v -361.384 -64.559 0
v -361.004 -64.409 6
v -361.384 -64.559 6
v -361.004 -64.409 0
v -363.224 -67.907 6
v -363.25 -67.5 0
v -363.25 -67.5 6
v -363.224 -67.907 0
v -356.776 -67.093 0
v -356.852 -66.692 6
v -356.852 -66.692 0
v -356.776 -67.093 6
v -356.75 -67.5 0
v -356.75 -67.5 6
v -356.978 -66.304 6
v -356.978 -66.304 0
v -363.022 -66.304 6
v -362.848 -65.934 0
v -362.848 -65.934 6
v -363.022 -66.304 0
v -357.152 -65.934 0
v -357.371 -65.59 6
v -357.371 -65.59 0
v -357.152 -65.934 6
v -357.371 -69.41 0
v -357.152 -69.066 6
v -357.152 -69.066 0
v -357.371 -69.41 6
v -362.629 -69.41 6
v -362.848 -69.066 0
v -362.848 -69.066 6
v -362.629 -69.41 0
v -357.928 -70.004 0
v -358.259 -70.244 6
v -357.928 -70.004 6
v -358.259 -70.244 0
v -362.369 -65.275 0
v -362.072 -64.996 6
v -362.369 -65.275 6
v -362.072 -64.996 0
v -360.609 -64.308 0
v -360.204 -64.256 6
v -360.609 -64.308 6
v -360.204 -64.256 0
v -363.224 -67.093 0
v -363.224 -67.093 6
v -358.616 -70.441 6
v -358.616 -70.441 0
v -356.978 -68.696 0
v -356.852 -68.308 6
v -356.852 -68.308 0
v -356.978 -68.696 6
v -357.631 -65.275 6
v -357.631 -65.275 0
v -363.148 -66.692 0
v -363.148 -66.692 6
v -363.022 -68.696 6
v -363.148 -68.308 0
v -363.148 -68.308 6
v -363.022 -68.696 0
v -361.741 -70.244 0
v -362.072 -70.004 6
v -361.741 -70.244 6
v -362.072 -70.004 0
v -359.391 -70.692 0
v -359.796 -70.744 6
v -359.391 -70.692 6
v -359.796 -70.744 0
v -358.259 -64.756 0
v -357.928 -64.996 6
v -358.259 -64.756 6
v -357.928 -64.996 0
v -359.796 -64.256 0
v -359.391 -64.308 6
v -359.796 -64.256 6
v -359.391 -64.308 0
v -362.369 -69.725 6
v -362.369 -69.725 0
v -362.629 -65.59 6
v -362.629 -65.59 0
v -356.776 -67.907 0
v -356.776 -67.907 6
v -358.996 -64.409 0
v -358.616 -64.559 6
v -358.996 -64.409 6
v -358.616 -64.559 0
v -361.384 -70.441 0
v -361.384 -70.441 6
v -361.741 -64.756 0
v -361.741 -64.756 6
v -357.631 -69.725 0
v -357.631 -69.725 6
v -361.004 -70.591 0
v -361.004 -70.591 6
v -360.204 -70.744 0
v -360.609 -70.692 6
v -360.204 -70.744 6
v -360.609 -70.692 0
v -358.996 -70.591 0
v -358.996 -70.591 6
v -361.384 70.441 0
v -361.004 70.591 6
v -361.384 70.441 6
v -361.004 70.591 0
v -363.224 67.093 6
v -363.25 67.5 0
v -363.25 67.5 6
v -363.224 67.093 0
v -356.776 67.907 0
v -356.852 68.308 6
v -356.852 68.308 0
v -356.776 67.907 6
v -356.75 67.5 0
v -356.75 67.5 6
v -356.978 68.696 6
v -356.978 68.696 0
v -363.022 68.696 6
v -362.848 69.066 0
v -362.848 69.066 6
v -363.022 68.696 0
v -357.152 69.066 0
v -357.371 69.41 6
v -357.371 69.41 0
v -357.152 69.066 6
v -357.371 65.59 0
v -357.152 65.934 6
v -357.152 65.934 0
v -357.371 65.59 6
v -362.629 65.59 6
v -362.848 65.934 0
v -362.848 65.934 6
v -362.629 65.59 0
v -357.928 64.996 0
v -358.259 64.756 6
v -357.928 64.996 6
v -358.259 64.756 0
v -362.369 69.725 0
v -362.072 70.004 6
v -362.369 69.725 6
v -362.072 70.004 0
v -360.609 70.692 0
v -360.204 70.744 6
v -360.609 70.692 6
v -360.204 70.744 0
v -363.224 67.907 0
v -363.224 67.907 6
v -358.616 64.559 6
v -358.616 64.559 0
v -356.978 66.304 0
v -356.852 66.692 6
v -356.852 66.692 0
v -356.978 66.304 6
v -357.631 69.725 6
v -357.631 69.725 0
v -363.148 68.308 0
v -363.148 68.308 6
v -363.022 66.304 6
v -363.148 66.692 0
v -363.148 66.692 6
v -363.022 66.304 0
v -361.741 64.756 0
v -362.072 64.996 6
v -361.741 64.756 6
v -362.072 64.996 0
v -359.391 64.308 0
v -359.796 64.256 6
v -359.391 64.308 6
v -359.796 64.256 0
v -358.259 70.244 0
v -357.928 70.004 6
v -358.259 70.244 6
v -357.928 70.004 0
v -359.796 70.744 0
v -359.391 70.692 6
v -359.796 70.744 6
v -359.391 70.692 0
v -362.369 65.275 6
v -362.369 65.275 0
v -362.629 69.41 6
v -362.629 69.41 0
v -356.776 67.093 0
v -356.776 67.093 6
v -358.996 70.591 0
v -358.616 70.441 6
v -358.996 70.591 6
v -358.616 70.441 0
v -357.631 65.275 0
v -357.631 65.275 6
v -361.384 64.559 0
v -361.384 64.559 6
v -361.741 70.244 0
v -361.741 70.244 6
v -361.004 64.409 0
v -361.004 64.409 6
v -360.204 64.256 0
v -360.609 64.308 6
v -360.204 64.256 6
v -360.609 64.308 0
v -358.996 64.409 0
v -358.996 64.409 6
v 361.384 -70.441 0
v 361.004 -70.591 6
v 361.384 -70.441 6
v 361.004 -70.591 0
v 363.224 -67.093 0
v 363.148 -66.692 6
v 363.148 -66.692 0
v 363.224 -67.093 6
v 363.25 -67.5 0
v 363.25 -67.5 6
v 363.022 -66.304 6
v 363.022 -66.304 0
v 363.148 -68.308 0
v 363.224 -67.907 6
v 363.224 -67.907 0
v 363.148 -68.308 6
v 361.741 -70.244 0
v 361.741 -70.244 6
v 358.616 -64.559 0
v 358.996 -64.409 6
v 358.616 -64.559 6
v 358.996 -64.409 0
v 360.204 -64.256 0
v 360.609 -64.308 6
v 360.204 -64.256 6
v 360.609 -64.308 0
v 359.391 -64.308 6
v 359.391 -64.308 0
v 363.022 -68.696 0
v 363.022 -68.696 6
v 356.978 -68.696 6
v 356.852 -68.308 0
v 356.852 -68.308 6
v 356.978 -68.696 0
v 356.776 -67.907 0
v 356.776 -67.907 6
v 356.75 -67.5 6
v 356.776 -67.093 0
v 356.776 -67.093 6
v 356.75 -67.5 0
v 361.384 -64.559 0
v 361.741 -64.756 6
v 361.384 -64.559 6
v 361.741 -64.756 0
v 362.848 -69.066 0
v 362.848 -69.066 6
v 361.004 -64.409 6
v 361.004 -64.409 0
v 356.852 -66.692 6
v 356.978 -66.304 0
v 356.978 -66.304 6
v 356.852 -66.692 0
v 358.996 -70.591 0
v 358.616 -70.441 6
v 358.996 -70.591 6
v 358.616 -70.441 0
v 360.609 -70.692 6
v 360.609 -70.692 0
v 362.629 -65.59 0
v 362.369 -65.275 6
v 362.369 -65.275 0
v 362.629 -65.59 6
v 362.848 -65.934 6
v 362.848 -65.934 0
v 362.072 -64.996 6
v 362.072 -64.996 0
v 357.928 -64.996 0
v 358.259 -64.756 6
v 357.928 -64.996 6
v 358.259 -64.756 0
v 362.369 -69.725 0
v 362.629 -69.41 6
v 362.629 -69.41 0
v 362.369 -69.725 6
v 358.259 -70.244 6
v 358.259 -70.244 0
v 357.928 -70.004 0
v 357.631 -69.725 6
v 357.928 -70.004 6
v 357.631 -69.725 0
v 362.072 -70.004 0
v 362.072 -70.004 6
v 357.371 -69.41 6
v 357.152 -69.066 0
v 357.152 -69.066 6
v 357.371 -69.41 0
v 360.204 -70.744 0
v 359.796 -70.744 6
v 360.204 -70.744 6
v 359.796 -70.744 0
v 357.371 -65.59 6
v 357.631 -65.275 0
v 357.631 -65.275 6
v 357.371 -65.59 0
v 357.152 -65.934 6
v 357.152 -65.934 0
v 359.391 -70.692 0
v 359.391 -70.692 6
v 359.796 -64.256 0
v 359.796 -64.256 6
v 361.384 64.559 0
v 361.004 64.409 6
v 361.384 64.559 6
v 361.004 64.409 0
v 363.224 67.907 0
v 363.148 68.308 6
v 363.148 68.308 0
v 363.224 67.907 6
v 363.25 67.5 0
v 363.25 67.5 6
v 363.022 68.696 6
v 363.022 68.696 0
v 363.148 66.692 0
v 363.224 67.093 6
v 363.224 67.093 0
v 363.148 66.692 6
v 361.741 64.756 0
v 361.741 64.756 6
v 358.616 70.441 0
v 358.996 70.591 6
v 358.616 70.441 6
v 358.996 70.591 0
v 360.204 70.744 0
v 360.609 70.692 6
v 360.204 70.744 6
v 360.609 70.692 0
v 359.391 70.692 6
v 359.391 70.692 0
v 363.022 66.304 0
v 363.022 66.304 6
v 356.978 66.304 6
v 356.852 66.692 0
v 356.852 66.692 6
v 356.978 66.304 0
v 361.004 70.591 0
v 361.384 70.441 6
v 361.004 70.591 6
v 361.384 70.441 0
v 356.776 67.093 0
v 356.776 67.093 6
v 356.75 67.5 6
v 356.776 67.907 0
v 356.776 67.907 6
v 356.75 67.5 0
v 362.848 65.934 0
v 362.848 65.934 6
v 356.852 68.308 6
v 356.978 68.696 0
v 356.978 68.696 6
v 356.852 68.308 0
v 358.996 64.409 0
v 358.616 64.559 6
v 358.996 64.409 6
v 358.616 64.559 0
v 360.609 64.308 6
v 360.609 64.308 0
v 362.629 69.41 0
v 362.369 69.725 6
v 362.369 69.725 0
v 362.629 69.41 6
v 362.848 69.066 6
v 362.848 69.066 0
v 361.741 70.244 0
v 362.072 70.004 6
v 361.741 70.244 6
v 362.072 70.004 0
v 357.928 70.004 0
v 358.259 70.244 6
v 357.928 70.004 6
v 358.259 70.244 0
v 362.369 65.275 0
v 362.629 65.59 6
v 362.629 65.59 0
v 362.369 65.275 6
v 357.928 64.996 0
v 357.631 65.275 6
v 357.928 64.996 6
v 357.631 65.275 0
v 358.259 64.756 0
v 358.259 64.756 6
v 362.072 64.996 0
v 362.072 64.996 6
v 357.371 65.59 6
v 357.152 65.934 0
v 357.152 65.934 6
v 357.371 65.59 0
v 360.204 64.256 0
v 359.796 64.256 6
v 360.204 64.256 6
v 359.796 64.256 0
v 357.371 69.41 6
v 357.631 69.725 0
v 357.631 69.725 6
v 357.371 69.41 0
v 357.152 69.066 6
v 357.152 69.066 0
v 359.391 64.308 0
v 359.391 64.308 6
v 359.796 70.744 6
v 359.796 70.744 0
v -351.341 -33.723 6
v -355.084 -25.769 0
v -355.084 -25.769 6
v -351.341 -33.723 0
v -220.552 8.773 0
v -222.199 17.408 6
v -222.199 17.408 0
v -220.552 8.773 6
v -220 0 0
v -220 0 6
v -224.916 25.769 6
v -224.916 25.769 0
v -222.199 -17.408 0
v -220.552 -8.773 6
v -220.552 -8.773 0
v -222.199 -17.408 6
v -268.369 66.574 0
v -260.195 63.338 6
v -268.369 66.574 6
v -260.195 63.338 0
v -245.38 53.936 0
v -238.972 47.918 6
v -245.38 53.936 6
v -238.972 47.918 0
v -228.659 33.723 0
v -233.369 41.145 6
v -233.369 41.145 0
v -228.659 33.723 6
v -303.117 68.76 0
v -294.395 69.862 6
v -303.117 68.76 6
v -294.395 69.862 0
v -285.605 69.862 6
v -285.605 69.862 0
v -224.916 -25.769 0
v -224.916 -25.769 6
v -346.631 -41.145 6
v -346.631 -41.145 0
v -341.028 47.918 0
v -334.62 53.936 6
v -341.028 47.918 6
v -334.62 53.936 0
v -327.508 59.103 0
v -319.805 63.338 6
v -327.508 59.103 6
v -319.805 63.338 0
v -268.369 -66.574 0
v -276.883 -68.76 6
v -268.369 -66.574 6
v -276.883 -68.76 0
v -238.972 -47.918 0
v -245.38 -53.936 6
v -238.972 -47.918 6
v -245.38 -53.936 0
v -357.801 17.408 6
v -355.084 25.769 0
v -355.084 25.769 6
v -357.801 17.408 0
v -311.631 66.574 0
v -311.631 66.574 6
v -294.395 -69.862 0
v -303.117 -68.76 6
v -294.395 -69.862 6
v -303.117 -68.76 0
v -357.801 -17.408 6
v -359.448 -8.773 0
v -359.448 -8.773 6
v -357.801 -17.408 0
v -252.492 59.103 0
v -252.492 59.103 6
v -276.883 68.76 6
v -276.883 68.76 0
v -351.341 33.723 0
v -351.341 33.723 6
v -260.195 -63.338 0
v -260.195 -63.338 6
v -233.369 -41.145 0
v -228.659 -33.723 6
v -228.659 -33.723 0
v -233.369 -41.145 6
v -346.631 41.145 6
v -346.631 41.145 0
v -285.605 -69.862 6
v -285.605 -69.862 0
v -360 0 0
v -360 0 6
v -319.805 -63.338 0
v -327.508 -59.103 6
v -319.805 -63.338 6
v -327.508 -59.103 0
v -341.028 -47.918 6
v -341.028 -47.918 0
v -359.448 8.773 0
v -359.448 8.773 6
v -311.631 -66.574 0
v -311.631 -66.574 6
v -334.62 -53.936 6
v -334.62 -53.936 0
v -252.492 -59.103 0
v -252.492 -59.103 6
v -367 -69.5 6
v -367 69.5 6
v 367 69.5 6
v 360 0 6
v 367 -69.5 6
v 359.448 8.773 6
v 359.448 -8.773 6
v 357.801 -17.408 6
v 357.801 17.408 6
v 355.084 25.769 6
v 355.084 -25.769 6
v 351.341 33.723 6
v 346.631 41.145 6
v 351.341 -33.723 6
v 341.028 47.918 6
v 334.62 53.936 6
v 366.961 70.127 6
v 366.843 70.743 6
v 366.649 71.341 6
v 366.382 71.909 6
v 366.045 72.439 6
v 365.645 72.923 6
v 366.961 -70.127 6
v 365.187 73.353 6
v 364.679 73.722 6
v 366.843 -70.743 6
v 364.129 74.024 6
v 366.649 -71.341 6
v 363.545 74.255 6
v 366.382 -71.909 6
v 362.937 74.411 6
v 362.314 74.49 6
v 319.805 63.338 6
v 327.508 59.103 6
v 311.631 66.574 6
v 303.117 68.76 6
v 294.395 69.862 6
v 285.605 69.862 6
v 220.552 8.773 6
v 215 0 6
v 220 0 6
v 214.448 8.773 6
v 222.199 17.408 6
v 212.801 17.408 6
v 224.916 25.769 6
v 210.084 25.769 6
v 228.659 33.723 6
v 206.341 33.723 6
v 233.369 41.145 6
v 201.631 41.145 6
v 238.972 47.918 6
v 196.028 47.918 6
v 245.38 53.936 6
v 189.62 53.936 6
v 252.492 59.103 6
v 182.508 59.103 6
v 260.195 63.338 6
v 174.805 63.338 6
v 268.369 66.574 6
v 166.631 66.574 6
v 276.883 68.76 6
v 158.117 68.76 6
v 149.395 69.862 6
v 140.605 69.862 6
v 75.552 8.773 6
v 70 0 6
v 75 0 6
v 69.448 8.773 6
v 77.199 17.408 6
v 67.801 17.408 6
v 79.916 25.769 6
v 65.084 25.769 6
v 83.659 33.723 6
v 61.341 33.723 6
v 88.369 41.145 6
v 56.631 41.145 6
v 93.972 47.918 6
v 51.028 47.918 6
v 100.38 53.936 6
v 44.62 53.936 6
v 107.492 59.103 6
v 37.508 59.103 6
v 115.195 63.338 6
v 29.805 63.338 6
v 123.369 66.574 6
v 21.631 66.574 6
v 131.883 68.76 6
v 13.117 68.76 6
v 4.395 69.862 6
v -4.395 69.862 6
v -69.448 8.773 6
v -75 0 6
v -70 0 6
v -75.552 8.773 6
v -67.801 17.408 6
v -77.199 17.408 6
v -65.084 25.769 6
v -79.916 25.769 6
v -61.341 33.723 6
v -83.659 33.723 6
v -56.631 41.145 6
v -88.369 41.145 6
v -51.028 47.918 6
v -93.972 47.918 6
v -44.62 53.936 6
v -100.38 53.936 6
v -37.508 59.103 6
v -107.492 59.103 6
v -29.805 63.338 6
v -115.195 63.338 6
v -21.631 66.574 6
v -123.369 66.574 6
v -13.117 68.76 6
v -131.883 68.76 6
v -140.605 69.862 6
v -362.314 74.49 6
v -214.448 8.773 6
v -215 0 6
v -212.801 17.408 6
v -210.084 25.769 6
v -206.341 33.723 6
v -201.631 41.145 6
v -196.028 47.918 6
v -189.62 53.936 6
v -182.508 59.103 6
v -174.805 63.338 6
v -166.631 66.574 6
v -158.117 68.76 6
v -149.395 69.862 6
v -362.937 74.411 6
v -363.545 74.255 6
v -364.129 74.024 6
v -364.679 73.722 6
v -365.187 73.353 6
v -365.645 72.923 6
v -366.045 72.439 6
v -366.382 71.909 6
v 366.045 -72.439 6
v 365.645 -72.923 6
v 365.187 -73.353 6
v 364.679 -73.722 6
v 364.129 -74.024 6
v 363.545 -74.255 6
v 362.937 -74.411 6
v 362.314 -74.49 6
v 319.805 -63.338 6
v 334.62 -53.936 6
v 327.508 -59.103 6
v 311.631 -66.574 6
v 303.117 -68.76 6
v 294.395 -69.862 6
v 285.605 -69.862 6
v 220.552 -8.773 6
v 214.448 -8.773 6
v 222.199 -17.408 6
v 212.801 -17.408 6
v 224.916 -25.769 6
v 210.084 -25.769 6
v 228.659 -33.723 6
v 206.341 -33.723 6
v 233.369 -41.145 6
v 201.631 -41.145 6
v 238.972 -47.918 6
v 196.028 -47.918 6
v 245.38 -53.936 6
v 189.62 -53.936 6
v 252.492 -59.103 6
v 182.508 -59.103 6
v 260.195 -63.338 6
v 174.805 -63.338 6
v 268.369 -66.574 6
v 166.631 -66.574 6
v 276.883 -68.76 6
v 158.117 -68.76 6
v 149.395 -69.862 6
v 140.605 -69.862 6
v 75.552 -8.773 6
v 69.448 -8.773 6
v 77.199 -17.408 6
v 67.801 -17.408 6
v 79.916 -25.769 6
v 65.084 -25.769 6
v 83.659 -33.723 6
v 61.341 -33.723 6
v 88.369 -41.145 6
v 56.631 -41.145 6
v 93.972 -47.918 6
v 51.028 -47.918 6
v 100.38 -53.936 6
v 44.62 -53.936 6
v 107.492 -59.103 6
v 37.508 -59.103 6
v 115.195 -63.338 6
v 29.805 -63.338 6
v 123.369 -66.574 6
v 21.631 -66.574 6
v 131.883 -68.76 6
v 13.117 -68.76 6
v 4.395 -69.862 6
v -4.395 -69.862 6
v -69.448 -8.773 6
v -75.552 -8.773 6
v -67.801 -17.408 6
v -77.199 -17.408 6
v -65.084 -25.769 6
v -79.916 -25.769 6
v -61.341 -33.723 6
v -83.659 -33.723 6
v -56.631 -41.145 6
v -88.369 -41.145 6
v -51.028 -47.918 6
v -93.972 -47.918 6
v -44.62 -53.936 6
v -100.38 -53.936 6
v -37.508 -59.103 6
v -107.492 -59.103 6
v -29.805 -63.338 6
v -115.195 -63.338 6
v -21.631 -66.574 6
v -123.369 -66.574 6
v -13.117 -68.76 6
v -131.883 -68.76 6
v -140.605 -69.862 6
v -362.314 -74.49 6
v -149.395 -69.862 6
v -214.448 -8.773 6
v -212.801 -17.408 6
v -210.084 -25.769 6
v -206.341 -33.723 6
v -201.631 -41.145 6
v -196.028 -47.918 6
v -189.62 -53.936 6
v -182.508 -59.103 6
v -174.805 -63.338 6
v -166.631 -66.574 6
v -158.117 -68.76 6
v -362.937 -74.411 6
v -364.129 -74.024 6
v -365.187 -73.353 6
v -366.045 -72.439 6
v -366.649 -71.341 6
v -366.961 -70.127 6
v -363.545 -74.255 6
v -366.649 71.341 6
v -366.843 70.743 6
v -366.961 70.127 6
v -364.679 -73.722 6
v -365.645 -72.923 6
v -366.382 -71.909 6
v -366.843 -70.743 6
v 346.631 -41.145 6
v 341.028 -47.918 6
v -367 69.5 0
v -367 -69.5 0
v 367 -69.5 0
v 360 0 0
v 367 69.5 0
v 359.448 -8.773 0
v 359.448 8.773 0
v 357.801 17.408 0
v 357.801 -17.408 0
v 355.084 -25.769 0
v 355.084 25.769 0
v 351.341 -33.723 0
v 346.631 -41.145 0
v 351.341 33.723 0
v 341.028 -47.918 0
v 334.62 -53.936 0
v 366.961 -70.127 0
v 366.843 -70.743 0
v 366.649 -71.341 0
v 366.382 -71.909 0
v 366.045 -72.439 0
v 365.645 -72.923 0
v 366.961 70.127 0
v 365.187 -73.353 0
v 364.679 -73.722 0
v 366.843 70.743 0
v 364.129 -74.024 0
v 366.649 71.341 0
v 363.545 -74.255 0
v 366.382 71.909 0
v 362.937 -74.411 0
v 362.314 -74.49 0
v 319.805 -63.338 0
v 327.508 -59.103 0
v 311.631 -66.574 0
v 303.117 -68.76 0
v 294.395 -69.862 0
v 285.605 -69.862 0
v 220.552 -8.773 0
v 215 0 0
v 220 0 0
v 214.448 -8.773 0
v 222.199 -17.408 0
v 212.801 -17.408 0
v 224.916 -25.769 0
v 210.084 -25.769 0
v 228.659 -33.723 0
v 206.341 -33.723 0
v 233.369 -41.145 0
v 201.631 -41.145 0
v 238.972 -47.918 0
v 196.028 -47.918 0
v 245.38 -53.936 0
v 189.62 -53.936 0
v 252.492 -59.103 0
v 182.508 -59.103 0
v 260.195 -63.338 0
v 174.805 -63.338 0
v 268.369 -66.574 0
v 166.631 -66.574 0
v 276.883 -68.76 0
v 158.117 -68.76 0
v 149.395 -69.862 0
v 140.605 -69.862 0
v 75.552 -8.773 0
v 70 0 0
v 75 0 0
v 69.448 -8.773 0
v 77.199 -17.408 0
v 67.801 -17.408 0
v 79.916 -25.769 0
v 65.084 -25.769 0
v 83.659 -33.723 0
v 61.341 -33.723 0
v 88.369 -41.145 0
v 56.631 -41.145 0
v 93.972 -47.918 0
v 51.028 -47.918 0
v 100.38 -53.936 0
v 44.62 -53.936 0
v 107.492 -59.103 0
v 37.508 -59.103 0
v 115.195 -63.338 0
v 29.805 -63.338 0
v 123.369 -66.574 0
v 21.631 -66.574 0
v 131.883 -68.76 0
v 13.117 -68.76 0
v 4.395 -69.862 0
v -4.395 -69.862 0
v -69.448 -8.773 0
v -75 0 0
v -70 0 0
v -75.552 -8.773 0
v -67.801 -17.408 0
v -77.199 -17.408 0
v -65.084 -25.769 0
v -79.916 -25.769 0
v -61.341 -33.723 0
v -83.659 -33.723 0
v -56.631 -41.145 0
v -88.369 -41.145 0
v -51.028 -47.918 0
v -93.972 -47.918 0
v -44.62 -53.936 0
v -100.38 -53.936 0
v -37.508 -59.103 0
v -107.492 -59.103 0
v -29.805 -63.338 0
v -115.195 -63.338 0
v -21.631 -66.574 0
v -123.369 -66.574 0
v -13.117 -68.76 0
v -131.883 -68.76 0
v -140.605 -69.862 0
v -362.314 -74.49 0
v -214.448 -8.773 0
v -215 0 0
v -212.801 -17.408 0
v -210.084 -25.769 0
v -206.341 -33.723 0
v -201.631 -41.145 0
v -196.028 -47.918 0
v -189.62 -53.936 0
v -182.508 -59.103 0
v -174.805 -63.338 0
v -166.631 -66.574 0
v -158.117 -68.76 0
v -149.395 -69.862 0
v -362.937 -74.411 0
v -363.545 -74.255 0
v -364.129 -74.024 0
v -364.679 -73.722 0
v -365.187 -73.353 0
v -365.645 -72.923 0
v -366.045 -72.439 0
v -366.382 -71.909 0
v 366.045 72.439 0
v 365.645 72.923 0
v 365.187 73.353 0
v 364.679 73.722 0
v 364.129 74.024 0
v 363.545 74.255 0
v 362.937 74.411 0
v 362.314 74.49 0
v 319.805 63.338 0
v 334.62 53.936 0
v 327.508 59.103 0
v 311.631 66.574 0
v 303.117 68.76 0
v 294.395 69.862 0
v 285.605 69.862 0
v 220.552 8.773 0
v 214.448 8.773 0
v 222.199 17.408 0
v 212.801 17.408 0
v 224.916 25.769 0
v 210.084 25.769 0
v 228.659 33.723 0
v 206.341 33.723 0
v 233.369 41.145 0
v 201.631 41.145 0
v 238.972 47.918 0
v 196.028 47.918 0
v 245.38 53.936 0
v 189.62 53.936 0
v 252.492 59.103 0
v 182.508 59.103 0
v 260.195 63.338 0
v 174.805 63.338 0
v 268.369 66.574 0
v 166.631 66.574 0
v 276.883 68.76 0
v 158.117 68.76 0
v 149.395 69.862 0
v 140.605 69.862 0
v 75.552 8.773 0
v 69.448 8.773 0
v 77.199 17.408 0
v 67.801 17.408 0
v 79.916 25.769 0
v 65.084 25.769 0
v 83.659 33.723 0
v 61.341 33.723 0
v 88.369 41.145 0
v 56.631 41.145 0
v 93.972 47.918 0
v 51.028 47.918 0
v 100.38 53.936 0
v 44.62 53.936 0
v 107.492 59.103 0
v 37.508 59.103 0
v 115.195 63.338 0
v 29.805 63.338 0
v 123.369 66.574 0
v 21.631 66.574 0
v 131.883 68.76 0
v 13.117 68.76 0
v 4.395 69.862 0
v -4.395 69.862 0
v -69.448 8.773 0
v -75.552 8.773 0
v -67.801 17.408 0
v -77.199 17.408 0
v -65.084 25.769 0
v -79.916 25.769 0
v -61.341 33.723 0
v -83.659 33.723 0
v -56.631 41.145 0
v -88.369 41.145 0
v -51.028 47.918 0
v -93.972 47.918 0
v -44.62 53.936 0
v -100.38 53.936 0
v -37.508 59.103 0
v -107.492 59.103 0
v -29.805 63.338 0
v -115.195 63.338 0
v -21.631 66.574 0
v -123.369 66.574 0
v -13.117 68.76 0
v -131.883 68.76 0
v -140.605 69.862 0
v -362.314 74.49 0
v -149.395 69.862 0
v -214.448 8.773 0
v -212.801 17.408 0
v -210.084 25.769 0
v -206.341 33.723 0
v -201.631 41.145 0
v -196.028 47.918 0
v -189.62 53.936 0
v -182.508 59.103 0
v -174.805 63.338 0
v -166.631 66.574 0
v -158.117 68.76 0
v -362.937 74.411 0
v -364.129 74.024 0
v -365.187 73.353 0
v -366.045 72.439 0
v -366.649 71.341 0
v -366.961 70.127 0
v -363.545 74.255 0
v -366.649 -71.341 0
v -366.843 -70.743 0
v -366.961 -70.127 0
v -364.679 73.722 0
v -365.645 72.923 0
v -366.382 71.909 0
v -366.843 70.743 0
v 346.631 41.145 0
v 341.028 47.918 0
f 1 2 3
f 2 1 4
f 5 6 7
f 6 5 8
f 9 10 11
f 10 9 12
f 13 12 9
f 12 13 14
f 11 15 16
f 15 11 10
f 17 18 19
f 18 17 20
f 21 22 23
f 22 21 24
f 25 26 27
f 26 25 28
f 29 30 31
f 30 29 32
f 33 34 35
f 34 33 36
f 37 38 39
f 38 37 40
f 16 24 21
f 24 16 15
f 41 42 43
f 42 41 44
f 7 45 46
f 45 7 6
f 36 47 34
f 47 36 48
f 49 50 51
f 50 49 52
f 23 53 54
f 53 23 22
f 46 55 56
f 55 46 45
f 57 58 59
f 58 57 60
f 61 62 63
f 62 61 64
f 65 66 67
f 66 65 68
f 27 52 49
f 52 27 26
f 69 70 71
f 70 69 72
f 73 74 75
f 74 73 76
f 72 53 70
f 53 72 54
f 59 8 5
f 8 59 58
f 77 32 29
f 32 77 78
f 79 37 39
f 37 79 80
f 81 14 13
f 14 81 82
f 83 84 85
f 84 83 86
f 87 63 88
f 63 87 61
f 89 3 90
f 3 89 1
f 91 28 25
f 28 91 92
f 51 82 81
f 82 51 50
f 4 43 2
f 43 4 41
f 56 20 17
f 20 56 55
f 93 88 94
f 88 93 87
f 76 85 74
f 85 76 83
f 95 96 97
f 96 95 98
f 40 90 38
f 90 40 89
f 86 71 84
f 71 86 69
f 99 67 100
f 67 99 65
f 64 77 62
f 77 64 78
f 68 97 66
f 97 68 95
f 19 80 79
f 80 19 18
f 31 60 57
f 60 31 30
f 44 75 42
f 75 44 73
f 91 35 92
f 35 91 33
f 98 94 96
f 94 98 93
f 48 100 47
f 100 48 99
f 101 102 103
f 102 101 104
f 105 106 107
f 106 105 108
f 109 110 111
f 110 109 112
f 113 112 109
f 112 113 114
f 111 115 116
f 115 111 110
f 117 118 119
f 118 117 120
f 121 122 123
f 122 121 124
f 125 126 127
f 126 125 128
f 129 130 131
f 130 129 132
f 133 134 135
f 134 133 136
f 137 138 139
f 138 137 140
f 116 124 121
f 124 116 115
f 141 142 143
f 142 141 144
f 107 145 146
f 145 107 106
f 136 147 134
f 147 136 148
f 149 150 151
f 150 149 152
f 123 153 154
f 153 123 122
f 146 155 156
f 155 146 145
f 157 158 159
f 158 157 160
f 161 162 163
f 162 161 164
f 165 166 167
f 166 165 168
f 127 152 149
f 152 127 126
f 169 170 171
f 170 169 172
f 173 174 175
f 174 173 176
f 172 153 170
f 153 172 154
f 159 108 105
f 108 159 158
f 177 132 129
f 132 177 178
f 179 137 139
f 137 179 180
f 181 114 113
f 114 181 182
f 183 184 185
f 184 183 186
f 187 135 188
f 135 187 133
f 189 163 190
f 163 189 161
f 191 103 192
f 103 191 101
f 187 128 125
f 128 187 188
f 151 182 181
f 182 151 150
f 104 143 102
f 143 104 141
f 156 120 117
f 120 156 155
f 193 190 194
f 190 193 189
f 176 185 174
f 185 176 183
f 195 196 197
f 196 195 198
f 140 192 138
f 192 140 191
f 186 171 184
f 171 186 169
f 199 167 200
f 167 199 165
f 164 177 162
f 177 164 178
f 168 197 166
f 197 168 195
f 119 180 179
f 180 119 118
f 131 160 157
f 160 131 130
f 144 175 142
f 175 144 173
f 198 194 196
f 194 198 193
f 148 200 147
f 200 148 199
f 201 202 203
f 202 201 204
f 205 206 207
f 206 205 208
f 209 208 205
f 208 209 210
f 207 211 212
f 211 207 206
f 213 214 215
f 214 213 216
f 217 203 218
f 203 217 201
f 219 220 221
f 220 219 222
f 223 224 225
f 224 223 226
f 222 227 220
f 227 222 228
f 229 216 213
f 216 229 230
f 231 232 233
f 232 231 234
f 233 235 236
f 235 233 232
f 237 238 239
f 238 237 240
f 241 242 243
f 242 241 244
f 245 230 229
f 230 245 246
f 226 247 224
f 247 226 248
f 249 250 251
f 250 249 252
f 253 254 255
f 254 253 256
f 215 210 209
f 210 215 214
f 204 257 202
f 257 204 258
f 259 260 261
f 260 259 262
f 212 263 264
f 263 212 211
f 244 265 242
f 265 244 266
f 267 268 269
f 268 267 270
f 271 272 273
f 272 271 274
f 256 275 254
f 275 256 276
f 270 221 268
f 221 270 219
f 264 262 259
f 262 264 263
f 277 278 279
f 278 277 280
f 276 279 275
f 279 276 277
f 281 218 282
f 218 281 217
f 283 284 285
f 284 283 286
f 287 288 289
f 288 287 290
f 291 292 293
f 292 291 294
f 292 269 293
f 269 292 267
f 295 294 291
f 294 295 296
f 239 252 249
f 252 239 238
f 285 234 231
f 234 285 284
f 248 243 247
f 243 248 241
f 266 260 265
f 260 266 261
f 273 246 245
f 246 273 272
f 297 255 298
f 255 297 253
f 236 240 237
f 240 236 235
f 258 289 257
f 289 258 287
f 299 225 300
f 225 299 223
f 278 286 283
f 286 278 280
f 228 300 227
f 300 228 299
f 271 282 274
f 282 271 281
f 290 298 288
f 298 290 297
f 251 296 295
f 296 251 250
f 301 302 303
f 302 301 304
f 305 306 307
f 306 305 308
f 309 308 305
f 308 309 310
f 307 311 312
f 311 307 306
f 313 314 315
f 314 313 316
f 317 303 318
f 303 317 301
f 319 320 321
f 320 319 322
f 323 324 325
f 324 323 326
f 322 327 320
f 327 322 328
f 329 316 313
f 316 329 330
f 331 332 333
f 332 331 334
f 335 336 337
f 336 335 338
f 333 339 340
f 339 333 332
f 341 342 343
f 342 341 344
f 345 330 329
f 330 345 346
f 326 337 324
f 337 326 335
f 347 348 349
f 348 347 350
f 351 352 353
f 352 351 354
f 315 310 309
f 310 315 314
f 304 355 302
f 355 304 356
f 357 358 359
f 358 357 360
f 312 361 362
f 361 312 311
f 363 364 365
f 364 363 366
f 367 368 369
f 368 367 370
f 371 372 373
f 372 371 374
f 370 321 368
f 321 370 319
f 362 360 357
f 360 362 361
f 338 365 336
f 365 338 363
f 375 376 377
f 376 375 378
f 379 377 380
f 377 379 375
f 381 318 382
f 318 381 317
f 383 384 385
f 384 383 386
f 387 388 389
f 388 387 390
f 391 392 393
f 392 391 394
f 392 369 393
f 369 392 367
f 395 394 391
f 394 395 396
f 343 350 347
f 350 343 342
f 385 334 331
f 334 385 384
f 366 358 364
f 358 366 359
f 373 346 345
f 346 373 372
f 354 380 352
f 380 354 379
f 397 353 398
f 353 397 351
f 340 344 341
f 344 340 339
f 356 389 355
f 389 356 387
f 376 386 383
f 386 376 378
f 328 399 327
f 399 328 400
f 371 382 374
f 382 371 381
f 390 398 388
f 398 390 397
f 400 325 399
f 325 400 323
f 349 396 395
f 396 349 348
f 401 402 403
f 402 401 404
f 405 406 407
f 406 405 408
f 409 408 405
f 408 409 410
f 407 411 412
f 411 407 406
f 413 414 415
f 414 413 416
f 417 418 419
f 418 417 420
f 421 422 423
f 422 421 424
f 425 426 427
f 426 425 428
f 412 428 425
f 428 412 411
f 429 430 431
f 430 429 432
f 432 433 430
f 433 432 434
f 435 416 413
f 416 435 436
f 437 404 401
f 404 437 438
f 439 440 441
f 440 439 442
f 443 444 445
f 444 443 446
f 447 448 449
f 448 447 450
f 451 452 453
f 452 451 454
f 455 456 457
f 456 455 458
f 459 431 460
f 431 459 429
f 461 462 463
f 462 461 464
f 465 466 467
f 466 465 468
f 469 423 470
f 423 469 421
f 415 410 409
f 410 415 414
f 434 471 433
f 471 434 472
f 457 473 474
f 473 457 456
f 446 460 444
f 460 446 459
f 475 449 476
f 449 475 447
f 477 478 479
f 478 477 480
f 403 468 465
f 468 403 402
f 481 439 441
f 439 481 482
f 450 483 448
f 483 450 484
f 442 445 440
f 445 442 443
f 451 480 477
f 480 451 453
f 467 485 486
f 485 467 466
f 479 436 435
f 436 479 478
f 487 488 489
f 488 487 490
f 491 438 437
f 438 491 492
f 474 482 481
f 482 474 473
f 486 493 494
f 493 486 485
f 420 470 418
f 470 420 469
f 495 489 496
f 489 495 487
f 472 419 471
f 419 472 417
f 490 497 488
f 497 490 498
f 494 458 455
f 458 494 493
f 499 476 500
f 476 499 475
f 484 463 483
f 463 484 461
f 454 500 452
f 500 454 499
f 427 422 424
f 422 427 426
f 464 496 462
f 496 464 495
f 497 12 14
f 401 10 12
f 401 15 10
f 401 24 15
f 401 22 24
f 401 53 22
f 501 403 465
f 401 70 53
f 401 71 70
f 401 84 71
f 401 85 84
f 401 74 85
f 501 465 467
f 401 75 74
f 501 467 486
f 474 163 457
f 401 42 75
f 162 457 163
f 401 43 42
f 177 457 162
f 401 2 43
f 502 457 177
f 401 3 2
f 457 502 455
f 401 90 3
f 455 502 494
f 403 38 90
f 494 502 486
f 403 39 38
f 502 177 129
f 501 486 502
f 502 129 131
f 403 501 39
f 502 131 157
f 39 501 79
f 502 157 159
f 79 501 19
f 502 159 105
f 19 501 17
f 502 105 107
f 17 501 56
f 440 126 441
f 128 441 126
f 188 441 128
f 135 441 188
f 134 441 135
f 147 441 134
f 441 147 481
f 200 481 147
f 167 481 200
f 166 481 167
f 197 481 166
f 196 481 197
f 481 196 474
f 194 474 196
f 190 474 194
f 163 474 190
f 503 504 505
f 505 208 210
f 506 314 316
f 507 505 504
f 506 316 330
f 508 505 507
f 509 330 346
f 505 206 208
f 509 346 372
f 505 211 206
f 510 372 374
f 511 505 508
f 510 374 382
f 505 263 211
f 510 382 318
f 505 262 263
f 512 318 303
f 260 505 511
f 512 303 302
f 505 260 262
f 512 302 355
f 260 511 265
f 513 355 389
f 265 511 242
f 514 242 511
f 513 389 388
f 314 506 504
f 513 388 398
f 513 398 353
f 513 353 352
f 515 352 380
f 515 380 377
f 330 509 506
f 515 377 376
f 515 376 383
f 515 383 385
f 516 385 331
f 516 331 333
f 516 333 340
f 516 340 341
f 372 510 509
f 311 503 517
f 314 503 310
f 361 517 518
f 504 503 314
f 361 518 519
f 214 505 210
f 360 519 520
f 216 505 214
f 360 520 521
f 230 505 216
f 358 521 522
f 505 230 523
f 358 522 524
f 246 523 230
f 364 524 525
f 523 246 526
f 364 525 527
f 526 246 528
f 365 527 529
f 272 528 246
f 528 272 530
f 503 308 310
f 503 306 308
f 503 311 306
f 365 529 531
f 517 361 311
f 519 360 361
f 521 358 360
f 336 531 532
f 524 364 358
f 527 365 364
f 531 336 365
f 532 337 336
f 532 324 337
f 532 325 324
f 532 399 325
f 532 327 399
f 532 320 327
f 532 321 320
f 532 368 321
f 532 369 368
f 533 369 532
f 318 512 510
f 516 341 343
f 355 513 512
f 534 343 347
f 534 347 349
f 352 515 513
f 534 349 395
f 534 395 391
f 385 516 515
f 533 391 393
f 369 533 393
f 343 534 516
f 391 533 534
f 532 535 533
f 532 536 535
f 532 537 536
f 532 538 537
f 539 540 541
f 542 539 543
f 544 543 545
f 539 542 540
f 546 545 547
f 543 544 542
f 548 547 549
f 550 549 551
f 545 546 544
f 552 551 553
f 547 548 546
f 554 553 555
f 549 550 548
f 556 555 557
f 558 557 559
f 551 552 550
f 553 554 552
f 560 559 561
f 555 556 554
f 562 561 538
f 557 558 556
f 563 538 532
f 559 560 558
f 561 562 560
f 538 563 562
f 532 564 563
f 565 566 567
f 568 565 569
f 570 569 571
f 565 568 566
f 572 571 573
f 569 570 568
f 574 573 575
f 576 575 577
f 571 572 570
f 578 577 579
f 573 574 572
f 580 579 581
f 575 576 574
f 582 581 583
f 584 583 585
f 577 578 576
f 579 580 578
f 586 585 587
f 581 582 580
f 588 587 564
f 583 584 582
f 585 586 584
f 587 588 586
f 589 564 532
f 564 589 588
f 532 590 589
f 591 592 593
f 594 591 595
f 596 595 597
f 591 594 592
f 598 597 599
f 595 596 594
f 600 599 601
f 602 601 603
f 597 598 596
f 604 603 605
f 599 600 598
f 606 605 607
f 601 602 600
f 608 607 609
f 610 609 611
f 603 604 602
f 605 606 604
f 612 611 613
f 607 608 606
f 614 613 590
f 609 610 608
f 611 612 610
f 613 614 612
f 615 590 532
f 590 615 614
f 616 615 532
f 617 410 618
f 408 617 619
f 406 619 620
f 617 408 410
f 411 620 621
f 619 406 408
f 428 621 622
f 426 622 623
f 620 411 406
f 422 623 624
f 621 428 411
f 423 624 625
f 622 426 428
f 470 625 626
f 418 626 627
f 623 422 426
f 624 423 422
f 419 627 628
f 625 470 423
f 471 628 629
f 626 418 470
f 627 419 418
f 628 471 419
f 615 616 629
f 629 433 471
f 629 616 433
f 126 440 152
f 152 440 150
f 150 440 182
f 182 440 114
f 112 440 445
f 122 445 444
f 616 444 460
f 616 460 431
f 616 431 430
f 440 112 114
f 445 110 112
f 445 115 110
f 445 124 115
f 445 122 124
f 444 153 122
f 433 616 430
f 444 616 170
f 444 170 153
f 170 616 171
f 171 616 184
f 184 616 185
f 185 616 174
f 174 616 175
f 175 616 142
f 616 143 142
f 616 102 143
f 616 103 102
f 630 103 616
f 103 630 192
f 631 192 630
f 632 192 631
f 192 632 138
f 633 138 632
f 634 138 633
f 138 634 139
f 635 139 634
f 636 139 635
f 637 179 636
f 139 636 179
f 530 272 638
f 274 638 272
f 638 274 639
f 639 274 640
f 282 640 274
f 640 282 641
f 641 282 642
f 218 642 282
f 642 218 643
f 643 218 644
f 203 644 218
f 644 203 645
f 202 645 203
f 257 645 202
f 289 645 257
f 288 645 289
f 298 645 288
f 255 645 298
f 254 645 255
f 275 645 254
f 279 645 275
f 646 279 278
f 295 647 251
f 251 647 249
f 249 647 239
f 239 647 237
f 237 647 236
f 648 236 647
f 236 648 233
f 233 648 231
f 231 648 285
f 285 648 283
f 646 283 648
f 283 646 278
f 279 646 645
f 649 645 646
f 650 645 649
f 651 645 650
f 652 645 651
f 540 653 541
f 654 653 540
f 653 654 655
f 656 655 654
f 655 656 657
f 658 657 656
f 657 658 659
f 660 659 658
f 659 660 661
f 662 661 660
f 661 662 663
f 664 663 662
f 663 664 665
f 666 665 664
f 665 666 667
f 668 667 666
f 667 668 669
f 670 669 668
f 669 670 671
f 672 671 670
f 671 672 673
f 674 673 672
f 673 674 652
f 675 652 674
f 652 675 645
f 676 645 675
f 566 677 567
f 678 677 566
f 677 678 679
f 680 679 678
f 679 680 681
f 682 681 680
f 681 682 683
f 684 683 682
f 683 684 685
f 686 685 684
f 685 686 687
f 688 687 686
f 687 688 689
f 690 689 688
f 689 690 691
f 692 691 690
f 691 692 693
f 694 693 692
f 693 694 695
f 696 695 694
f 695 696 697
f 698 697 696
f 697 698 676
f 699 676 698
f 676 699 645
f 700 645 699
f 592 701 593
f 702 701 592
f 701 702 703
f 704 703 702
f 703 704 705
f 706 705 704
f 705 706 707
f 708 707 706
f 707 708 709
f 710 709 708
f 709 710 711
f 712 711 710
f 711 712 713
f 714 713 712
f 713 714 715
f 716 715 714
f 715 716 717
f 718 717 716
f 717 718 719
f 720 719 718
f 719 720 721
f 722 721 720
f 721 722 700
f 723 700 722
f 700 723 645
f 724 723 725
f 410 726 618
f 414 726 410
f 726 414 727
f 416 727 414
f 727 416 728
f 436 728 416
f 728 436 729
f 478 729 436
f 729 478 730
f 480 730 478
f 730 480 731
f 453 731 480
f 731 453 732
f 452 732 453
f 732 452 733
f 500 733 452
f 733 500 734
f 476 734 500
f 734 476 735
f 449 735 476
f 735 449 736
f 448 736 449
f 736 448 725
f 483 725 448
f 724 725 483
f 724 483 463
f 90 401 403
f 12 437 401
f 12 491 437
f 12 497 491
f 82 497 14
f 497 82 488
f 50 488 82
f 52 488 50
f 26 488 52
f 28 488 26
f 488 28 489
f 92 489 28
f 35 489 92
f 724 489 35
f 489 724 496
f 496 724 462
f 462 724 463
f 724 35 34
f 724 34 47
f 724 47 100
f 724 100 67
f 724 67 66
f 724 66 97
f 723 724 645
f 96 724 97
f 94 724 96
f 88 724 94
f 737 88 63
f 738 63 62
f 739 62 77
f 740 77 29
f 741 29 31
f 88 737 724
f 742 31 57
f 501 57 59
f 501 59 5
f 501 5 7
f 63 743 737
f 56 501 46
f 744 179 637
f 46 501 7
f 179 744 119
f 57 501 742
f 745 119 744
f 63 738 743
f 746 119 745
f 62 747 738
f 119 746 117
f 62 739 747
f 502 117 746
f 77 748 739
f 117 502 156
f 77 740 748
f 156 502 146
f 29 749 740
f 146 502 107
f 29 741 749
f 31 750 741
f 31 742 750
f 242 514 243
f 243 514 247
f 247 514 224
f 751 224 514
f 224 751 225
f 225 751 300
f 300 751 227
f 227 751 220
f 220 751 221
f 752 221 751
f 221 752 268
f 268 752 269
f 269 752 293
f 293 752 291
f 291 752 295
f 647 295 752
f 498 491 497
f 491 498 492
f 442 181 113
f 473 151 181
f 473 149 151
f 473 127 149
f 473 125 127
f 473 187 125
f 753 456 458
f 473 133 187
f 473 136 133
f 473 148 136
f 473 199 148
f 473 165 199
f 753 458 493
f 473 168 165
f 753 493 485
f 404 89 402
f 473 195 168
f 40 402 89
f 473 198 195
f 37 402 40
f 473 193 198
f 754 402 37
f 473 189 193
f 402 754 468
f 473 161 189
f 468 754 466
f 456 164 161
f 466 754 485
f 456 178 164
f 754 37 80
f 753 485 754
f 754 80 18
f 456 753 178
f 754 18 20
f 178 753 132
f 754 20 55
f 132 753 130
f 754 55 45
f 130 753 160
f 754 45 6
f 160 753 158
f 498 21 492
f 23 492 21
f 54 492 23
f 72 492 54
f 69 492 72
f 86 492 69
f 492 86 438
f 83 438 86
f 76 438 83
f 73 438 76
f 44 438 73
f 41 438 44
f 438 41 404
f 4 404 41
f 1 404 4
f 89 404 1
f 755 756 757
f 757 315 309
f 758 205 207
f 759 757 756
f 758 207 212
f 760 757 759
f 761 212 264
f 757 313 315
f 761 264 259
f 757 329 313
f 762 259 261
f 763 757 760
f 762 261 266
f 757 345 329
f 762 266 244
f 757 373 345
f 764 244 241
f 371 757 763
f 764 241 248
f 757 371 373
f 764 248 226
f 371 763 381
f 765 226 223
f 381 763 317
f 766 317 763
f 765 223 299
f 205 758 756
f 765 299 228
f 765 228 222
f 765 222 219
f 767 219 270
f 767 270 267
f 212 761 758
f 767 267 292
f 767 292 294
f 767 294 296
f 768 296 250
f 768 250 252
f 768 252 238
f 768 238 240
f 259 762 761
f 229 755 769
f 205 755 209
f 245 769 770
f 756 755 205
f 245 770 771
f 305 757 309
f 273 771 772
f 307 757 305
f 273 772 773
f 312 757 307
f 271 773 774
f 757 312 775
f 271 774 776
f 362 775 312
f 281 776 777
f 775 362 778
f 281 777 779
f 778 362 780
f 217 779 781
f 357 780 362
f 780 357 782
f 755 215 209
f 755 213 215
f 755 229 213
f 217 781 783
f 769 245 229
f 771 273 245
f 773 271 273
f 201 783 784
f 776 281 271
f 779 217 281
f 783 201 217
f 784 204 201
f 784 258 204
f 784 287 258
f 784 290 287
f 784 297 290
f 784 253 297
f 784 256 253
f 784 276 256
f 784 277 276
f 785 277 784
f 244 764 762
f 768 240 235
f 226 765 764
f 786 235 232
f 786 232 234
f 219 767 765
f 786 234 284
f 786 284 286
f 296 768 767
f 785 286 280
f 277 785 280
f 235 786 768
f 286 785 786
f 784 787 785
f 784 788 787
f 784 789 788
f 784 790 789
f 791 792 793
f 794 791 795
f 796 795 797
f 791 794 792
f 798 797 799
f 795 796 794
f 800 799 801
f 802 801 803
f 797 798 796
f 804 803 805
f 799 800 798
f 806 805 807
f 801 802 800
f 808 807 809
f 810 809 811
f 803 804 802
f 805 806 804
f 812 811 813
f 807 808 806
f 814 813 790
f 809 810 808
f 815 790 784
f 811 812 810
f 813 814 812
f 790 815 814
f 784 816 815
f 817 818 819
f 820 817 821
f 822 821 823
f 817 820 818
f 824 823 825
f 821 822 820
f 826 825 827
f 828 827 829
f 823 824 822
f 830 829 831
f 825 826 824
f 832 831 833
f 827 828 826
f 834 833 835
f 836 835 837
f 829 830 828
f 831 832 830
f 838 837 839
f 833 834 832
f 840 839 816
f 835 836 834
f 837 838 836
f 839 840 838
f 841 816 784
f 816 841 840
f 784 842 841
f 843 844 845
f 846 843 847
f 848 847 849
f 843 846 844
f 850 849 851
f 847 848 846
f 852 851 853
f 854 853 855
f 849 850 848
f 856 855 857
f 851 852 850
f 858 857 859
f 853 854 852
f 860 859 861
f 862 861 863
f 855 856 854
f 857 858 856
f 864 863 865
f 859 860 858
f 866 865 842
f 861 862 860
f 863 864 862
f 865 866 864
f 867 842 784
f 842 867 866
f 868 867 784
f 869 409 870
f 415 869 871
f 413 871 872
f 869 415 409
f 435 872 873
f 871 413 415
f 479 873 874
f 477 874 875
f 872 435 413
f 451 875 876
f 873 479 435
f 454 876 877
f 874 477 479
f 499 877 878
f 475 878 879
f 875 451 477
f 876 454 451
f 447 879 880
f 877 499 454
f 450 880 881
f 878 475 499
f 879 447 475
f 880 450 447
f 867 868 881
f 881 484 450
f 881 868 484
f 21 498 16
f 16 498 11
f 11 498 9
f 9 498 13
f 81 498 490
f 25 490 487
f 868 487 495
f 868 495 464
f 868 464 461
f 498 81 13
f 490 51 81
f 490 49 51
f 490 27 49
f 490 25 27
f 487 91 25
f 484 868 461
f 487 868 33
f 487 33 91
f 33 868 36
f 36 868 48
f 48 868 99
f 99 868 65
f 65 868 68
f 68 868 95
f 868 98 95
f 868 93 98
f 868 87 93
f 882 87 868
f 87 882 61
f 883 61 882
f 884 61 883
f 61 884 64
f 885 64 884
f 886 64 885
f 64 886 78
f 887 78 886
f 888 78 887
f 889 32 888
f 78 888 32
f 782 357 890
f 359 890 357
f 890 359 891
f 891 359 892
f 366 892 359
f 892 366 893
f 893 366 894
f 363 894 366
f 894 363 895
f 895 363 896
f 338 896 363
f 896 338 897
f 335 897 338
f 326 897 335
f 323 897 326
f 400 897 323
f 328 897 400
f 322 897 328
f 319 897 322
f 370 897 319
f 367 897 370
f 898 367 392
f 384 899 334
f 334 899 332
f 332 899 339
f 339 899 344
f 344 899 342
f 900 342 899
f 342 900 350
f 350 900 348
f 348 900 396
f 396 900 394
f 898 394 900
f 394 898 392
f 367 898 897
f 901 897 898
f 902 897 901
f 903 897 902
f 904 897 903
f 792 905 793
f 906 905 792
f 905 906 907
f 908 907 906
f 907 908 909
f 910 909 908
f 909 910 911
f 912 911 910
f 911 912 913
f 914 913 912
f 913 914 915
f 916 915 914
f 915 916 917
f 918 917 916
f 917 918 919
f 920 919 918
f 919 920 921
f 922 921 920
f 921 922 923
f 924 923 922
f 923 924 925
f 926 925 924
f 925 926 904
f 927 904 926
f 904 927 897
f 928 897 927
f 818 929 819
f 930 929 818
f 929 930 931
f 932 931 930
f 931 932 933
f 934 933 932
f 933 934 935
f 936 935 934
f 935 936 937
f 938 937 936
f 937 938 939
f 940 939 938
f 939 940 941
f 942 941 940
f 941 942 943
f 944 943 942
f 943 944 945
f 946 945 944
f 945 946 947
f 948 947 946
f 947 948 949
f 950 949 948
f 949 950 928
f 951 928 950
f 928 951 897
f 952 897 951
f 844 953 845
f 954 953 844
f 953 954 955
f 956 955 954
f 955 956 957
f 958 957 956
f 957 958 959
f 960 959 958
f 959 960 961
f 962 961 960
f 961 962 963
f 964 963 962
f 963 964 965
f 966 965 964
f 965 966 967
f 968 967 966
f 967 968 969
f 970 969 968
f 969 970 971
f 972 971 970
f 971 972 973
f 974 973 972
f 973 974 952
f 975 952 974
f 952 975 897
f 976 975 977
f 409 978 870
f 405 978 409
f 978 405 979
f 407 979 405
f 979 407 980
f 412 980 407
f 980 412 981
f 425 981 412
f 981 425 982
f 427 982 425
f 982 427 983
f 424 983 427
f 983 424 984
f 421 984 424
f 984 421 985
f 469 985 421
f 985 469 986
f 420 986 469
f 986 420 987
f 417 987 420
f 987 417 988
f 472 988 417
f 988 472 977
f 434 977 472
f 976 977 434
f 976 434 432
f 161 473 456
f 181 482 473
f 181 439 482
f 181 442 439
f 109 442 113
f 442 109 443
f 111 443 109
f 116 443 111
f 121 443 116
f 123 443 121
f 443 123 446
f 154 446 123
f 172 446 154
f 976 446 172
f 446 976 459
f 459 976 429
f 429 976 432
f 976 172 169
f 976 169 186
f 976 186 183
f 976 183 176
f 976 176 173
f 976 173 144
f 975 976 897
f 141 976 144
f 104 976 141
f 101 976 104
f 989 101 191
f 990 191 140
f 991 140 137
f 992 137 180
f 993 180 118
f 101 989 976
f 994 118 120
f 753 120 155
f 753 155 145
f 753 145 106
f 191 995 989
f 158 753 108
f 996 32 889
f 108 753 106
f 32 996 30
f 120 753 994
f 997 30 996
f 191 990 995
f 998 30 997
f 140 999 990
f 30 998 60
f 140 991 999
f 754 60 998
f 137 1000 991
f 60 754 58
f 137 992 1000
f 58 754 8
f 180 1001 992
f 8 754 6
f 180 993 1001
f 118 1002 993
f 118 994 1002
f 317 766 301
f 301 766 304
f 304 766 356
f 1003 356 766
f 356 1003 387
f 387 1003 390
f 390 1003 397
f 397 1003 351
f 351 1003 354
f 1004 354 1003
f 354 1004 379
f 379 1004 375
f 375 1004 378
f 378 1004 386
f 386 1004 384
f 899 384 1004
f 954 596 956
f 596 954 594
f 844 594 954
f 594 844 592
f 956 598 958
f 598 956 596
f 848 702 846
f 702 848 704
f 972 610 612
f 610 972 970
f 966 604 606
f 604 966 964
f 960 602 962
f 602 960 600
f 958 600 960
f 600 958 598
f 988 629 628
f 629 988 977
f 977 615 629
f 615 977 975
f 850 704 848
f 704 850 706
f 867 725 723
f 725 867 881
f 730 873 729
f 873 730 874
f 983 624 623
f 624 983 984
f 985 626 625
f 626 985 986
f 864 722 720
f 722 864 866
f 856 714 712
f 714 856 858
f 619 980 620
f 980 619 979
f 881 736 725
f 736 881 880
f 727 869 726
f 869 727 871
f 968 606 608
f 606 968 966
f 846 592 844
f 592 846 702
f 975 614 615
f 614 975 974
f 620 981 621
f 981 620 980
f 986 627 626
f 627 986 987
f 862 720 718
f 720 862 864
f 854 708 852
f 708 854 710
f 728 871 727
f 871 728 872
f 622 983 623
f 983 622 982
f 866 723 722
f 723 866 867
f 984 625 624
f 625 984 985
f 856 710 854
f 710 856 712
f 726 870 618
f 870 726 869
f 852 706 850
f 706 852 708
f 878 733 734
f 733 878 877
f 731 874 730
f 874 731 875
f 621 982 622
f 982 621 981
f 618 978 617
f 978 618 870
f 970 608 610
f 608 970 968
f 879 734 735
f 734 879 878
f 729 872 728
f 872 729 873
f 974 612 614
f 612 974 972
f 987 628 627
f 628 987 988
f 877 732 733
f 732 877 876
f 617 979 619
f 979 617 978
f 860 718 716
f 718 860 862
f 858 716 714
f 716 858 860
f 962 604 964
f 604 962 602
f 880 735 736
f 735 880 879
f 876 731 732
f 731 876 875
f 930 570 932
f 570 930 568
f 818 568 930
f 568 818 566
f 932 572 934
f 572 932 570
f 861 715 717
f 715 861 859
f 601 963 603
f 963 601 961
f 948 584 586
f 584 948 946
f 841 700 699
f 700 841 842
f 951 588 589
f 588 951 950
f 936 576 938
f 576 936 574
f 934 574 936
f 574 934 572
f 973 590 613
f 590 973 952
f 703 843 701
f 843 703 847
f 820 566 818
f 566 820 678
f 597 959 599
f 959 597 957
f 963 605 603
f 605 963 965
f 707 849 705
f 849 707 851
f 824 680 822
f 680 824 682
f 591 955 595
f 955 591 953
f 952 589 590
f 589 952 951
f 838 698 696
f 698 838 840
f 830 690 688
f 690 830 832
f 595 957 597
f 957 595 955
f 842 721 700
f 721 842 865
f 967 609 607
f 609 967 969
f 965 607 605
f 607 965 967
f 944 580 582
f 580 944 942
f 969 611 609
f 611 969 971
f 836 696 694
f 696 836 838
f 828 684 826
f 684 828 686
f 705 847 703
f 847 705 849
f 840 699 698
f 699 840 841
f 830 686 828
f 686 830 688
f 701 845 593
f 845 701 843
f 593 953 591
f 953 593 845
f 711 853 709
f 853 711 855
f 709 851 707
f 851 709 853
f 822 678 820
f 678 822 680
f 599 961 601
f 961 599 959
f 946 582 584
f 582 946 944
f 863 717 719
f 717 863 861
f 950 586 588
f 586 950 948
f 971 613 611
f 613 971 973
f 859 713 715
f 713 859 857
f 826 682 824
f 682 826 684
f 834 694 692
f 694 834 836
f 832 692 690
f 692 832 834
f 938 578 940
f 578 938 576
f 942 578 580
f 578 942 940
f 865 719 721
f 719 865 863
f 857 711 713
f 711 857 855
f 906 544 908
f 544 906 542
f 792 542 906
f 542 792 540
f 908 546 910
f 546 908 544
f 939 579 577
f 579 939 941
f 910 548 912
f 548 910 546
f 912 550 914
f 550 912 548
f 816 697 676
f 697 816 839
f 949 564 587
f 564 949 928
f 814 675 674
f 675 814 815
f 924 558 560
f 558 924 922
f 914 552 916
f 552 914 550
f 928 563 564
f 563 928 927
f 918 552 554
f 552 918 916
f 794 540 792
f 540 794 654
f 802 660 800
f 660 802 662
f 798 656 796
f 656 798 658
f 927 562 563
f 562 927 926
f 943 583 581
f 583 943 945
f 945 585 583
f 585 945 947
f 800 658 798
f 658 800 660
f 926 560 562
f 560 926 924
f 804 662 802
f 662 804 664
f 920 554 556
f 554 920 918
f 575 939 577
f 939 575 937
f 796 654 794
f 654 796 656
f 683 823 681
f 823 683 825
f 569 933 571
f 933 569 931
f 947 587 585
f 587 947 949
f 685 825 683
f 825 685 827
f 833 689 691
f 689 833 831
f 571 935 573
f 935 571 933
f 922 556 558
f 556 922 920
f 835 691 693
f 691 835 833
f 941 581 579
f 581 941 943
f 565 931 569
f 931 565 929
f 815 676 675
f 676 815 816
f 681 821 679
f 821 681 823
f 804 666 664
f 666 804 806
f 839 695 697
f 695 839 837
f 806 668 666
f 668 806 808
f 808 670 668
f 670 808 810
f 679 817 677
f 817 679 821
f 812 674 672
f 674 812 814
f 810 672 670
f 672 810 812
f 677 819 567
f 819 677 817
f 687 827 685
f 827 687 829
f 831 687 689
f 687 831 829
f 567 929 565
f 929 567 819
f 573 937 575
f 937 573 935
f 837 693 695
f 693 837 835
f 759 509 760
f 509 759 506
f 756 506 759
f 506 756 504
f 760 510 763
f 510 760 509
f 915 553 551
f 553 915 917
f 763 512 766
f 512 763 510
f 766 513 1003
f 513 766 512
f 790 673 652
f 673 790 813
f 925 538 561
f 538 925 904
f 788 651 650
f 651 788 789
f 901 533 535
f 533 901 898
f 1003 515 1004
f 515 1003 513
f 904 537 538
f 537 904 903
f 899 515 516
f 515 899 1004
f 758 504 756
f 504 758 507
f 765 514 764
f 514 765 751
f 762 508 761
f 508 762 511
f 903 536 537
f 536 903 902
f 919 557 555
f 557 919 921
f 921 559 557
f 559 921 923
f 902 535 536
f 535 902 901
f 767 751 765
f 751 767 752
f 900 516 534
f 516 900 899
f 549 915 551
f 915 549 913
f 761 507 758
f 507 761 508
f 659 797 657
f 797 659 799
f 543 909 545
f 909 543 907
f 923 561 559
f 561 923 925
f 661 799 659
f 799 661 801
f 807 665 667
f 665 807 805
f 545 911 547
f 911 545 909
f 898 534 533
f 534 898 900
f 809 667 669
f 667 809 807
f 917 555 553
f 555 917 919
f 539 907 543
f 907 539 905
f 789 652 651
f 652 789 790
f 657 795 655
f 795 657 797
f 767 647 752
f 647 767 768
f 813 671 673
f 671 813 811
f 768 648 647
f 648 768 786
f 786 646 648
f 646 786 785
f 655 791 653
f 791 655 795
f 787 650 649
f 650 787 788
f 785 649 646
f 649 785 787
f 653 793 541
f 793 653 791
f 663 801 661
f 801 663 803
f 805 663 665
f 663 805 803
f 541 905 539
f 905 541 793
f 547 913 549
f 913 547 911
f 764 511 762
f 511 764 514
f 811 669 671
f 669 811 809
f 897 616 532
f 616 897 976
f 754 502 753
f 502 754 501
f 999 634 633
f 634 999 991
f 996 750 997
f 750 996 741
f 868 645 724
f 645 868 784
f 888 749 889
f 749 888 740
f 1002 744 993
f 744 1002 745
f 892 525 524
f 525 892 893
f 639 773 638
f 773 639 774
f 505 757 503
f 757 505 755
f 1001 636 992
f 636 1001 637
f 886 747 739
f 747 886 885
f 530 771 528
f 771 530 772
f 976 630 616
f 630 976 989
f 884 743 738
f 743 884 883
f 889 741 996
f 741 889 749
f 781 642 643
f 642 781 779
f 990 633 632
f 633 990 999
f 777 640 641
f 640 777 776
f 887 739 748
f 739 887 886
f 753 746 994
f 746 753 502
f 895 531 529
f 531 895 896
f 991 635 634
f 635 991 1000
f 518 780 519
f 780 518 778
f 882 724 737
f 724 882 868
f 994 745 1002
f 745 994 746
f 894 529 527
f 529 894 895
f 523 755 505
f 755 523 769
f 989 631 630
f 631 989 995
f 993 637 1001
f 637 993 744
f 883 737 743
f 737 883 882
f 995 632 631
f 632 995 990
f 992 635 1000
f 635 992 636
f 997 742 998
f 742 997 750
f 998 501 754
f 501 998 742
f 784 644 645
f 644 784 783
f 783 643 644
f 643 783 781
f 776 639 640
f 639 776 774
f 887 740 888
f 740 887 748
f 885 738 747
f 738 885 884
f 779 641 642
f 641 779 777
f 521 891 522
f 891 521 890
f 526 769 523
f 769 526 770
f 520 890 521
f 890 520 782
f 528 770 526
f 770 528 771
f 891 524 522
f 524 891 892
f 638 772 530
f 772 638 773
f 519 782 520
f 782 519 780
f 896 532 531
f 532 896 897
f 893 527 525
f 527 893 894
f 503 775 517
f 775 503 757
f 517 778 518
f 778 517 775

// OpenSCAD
$fn = 50;


difference() {
	union() {
		hull() {
			translate(v = [-362.0000000000, 69.5000000000, 0]) {
				cylinder(h = 6, r = 5);
			}
			translate(v = [362.0000000000, 69.5000000000, 0]) {
				cylinder(h = 6, r = 5);
			}
			translate(v = [-362.0000000000, -69.5000000000, 0]) {
				cylinder(h = 6, r = 5);
			}
			translate(v = [362.0000000000, -69.5000000000, 0]) {
				cylinder(h = 6, r = 5);
			}
		}
	}
	union() {
		#translate(v = [-360.0000000000, -67.5000000000, -100.0000000000]) {
			cylinder(h = 200, r = 3.2500000000);
		}
		#translate(v = [-360.0000000000, 67.5000000000, -100.0000000000]) {
			cylinder(h = 200, r = 3.2500000000);
		}
		#translate(v = [360.0000000000, -67.5000000000, -100.0000000000]) {
			cylinder(h = 200, r = 3.2500000000);
		}
		#translate(v = [360.0000000000, 67.5000000000, -100.0000000000]) {
			cylinder(h = 200, r = 3.2500000000);
		}
		#translate(v = [-290.0000000000, 0, 0]) {
			cylinder(h = 6, r = 70.0000000000);
		}
		#translate(v = [-145.0000000000, 0, 0]) {
			cylinder(h = 6, r = 70.0000000000);
		}
		#cylinder(h = 6, r = 70.0000000000);
		#translate(v = [145.0000000000, 0, 0]) {
			cylinder(h = 6, r = 70.0000000000);
		}
		#translate(v = [290.0000000000, 0, 0]) {
			cylinder(h = 6, r = 70.0000000000);
		}
	}
}
